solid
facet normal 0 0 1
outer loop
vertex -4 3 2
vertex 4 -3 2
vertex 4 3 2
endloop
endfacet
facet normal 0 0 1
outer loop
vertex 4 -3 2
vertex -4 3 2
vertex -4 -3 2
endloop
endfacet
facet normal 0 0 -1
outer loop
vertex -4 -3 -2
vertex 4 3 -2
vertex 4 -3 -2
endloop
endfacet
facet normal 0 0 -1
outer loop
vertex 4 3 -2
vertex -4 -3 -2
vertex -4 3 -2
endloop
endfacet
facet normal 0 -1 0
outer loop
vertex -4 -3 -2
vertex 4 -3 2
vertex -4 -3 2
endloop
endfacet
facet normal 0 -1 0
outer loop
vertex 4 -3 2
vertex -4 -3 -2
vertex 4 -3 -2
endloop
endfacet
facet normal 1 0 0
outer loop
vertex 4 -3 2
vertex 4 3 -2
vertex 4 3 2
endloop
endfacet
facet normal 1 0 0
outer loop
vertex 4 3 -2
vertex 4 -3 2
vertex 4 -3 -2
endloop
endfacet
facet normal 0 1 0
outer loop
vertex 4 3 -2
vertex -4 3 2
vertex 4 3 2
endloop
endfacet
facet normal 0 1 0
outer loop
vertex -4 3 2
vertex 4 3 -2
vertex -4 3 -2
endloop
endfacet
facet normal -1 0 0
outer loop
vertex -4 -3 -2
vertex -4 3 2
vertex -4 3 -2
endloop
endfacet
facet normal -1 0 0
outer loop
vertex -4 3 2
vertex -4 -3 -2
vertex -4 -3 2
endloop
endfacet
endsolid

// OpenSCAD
// Auto-generated from tests/data/feature_fixtures_manifest.json
// fixture: box_small
// fixture_type: box
// description: Small box (8x6x4 mm) to verify scale invariance of the box_like_solid detector.
$fn = 96;

box_size = [8.000000, 6.000000, 4.000000];
box_origin = [-4.000000, -3.000000, -2.000000];

module through_hole_x(center, diameter, length) {
  translate([box_origin[0] - 0.1, center[1], center[2]])
    rotate(a=90, v=[0, 1, 0]) cylinder(d=diameter, h=length, center=false);
}

module through_hole_y(center, diameter, length) {
  translate([center[0], box_origin[1] - 0.1, center[2]])
    rotate(a=90, v=[-1, 0, 0]) cylinder(d=diameter, h=length, center=false);
}

module through_hole_z(center, diameter, length) {
  translate([center[0], center[1], box_origin[2] - 0.1])
    cylinder(d=diameter, h=length, center=false);
}

difference() {
  translate(box_origin) cube(box_size);
}
